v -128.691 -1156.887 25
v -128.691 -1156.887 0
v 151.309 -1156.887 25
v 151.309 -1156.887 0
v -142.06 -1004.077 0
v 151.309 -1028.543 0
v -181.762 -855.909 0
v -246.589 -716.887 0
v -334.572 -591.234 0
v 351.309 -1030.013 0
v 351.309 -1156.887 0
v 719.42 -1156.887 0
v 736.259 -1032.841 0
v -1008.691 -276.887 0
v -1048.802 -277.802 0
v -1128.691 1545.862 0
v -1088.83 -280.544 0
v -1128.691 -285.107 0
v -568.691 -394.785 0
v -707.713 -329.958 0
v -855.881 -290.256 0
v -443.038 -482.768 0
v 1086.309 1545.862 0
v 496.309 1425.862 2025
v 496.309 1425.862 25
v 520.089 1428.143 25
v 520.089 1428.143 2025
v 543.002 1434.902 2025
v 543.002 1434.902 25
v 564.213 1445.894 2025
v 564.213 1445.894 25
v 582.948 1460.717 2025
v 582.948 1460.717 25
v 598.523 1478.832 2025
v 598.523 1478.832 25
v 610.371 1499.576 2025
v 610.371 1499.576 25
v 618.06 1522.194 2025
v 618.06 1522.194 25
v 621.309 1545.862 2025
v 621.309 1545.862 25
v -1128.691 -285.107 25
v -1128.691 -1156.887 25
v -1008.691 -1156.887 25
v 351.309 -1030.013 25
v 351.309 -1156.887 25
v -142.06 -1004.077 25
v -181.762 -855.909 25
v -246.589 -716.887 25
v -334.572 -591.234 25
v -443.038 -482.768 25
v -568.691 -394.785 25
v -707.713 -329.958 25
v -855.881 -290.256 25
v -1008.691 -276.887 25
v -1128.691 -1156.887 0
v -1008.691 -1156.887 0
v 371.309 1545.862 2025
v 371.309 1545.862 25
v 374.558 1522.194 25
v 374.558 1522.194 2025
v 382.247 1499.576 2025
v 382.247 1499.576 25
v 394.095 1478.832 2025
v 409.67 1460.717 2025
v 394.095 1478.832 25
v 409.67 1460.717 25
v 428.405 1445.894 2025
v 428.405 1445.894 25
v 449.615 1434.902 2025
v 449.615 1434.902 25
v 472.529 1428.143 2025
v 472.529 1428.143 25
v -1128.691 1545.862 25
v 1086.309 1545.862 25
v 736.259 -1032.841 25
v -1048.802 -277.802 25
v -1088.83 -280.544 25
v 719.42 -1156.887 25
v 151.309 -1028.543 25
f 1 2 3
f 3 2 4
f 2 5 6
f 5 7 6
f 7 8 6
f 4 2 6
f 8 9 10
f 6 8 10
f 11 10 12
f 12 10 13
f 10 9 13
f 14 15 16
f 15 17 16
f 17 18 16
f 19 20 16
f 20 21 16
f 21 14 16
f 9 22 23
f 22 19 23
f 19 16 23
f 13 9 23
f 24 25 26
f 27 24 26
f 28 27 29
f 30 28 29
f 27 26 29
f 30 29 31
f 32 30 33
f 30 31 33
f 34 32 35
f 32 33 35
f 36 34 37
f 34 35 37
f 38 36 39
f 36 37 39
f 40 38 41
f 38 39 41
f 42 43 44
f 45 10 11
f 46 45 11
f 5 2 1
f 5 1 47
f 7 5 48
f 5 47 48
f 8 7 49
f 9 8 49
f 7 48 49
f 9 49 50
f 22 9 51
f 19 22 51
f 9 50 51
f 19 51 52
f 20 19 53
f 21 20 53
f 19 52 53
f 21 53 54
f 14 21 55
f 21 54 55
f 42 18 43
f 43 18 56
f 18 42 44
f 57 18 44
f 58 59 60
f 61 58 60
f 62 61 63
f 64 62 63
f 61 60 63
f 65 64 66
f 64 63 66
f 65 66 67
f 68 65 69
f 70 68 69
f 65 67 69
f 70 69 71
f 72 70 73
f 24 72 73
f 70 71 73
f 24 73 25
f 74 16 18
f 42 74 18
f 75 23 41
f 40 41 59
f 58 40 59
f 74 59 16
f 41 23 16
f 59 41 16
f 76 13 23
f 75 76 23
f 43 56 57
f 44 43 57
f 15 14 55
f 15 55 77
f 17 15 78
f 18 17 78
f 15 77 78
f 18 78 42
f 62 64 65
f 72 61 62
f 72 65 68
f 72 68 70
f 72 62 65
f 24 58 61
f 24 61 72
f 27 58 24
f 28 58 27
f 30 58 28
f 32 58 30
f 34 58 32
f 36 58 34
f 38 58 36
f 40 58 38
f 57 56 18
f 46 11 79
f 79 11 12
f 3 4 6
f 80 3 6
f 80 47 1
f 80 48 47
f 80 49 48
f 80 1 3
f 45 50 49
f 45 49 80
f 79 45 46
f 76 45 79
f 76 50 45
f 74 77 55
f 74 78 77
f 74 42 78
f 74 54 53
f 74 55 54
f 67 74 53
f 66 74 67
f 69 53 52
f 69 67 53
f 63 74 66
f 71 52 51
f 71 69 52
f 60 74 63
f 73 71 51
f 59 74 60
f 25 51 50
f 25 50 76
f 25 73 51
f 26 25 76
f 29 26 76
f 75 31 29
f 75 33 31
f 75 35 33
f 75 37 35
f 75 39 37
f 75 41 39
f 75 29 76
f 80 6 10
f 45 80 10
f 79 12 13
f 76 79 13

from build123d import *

# Parameters (mm, degrees)
F1_DEPTH = 25
F3_DEPTH = 25.001
F5_DEPTH = 2000


with BuildPart() as f1:
    # F0 (on Top) → F1 (new body)
    with BuildSketch(Plane.XY):
        Polygon((-1128.69109, 1545.861838), (-1128.69109, -1019.138162), (151.30891, -1028.54325), (351.30891, -1030.012795), (736.258567, -1032.8413), (1086.30891, 1545.861838), align=None)
        Polygon((151.30891, -1028.54325), (-1128.69109, -1019.138162), (-1128.69109, -1156.887209), (151.30891, -1156.887209), align=None)
        Polygon((736.258567, -1032.8413), (351.30891, -1030.012795), (351.30891, -1156.887209), (719.419749, -1156.887209), align=None)
    extrude(amount=F1_DEPTH)

    # F2 (on face) → F3 (cut, through all)
    with BuildSketch(Plane.XY.offset(25)):
        with BuildLine():
            Line((-1008.69109, -276.887209), (-1008.69109, -1156.887209))
            Line((-1008.69109, -1156.887209), (-128.69109, -1156.887209))
            ThreePointArc((-128.69109, -1156.887209), (-386.437123, -534.633242), (-1008.69109, -276.887209))
        make_face()
        with BuildLine():
            Line((-1128.69109, -285.107421), (-1008.69109, -1156.887209))
            Line((-1008.69109, -1156.887209), (-1008.69109, -276.887209))
            ThreePointArc((-1008.69109, -276.887209), (-1068.8317, -278.944668), (-1128.69109, -285.107421))
        make_face()
    extrude(amount=-F3_DEPTH, mode=Mode.SUBTRACT)

    # F4 (on face) → F5 (join)
    with BuildSketch(Plane.XY.offset(25)):
        with BuildLine():
            Line((621.30891, 1545.861838), (371.30891, 1545.861838))
            ThreePointArc((371.30891, 1545.861838), (409.670292, 1460.717445), (496.30891, 1425.861838))
            ThreePointArc((496.30891, 1425.861838), (582.947527, 1460.717445), (621.30891, 1545.861838))
        make_face()
    extrude(amount=F5_DEPTH)


solid = f1.part
